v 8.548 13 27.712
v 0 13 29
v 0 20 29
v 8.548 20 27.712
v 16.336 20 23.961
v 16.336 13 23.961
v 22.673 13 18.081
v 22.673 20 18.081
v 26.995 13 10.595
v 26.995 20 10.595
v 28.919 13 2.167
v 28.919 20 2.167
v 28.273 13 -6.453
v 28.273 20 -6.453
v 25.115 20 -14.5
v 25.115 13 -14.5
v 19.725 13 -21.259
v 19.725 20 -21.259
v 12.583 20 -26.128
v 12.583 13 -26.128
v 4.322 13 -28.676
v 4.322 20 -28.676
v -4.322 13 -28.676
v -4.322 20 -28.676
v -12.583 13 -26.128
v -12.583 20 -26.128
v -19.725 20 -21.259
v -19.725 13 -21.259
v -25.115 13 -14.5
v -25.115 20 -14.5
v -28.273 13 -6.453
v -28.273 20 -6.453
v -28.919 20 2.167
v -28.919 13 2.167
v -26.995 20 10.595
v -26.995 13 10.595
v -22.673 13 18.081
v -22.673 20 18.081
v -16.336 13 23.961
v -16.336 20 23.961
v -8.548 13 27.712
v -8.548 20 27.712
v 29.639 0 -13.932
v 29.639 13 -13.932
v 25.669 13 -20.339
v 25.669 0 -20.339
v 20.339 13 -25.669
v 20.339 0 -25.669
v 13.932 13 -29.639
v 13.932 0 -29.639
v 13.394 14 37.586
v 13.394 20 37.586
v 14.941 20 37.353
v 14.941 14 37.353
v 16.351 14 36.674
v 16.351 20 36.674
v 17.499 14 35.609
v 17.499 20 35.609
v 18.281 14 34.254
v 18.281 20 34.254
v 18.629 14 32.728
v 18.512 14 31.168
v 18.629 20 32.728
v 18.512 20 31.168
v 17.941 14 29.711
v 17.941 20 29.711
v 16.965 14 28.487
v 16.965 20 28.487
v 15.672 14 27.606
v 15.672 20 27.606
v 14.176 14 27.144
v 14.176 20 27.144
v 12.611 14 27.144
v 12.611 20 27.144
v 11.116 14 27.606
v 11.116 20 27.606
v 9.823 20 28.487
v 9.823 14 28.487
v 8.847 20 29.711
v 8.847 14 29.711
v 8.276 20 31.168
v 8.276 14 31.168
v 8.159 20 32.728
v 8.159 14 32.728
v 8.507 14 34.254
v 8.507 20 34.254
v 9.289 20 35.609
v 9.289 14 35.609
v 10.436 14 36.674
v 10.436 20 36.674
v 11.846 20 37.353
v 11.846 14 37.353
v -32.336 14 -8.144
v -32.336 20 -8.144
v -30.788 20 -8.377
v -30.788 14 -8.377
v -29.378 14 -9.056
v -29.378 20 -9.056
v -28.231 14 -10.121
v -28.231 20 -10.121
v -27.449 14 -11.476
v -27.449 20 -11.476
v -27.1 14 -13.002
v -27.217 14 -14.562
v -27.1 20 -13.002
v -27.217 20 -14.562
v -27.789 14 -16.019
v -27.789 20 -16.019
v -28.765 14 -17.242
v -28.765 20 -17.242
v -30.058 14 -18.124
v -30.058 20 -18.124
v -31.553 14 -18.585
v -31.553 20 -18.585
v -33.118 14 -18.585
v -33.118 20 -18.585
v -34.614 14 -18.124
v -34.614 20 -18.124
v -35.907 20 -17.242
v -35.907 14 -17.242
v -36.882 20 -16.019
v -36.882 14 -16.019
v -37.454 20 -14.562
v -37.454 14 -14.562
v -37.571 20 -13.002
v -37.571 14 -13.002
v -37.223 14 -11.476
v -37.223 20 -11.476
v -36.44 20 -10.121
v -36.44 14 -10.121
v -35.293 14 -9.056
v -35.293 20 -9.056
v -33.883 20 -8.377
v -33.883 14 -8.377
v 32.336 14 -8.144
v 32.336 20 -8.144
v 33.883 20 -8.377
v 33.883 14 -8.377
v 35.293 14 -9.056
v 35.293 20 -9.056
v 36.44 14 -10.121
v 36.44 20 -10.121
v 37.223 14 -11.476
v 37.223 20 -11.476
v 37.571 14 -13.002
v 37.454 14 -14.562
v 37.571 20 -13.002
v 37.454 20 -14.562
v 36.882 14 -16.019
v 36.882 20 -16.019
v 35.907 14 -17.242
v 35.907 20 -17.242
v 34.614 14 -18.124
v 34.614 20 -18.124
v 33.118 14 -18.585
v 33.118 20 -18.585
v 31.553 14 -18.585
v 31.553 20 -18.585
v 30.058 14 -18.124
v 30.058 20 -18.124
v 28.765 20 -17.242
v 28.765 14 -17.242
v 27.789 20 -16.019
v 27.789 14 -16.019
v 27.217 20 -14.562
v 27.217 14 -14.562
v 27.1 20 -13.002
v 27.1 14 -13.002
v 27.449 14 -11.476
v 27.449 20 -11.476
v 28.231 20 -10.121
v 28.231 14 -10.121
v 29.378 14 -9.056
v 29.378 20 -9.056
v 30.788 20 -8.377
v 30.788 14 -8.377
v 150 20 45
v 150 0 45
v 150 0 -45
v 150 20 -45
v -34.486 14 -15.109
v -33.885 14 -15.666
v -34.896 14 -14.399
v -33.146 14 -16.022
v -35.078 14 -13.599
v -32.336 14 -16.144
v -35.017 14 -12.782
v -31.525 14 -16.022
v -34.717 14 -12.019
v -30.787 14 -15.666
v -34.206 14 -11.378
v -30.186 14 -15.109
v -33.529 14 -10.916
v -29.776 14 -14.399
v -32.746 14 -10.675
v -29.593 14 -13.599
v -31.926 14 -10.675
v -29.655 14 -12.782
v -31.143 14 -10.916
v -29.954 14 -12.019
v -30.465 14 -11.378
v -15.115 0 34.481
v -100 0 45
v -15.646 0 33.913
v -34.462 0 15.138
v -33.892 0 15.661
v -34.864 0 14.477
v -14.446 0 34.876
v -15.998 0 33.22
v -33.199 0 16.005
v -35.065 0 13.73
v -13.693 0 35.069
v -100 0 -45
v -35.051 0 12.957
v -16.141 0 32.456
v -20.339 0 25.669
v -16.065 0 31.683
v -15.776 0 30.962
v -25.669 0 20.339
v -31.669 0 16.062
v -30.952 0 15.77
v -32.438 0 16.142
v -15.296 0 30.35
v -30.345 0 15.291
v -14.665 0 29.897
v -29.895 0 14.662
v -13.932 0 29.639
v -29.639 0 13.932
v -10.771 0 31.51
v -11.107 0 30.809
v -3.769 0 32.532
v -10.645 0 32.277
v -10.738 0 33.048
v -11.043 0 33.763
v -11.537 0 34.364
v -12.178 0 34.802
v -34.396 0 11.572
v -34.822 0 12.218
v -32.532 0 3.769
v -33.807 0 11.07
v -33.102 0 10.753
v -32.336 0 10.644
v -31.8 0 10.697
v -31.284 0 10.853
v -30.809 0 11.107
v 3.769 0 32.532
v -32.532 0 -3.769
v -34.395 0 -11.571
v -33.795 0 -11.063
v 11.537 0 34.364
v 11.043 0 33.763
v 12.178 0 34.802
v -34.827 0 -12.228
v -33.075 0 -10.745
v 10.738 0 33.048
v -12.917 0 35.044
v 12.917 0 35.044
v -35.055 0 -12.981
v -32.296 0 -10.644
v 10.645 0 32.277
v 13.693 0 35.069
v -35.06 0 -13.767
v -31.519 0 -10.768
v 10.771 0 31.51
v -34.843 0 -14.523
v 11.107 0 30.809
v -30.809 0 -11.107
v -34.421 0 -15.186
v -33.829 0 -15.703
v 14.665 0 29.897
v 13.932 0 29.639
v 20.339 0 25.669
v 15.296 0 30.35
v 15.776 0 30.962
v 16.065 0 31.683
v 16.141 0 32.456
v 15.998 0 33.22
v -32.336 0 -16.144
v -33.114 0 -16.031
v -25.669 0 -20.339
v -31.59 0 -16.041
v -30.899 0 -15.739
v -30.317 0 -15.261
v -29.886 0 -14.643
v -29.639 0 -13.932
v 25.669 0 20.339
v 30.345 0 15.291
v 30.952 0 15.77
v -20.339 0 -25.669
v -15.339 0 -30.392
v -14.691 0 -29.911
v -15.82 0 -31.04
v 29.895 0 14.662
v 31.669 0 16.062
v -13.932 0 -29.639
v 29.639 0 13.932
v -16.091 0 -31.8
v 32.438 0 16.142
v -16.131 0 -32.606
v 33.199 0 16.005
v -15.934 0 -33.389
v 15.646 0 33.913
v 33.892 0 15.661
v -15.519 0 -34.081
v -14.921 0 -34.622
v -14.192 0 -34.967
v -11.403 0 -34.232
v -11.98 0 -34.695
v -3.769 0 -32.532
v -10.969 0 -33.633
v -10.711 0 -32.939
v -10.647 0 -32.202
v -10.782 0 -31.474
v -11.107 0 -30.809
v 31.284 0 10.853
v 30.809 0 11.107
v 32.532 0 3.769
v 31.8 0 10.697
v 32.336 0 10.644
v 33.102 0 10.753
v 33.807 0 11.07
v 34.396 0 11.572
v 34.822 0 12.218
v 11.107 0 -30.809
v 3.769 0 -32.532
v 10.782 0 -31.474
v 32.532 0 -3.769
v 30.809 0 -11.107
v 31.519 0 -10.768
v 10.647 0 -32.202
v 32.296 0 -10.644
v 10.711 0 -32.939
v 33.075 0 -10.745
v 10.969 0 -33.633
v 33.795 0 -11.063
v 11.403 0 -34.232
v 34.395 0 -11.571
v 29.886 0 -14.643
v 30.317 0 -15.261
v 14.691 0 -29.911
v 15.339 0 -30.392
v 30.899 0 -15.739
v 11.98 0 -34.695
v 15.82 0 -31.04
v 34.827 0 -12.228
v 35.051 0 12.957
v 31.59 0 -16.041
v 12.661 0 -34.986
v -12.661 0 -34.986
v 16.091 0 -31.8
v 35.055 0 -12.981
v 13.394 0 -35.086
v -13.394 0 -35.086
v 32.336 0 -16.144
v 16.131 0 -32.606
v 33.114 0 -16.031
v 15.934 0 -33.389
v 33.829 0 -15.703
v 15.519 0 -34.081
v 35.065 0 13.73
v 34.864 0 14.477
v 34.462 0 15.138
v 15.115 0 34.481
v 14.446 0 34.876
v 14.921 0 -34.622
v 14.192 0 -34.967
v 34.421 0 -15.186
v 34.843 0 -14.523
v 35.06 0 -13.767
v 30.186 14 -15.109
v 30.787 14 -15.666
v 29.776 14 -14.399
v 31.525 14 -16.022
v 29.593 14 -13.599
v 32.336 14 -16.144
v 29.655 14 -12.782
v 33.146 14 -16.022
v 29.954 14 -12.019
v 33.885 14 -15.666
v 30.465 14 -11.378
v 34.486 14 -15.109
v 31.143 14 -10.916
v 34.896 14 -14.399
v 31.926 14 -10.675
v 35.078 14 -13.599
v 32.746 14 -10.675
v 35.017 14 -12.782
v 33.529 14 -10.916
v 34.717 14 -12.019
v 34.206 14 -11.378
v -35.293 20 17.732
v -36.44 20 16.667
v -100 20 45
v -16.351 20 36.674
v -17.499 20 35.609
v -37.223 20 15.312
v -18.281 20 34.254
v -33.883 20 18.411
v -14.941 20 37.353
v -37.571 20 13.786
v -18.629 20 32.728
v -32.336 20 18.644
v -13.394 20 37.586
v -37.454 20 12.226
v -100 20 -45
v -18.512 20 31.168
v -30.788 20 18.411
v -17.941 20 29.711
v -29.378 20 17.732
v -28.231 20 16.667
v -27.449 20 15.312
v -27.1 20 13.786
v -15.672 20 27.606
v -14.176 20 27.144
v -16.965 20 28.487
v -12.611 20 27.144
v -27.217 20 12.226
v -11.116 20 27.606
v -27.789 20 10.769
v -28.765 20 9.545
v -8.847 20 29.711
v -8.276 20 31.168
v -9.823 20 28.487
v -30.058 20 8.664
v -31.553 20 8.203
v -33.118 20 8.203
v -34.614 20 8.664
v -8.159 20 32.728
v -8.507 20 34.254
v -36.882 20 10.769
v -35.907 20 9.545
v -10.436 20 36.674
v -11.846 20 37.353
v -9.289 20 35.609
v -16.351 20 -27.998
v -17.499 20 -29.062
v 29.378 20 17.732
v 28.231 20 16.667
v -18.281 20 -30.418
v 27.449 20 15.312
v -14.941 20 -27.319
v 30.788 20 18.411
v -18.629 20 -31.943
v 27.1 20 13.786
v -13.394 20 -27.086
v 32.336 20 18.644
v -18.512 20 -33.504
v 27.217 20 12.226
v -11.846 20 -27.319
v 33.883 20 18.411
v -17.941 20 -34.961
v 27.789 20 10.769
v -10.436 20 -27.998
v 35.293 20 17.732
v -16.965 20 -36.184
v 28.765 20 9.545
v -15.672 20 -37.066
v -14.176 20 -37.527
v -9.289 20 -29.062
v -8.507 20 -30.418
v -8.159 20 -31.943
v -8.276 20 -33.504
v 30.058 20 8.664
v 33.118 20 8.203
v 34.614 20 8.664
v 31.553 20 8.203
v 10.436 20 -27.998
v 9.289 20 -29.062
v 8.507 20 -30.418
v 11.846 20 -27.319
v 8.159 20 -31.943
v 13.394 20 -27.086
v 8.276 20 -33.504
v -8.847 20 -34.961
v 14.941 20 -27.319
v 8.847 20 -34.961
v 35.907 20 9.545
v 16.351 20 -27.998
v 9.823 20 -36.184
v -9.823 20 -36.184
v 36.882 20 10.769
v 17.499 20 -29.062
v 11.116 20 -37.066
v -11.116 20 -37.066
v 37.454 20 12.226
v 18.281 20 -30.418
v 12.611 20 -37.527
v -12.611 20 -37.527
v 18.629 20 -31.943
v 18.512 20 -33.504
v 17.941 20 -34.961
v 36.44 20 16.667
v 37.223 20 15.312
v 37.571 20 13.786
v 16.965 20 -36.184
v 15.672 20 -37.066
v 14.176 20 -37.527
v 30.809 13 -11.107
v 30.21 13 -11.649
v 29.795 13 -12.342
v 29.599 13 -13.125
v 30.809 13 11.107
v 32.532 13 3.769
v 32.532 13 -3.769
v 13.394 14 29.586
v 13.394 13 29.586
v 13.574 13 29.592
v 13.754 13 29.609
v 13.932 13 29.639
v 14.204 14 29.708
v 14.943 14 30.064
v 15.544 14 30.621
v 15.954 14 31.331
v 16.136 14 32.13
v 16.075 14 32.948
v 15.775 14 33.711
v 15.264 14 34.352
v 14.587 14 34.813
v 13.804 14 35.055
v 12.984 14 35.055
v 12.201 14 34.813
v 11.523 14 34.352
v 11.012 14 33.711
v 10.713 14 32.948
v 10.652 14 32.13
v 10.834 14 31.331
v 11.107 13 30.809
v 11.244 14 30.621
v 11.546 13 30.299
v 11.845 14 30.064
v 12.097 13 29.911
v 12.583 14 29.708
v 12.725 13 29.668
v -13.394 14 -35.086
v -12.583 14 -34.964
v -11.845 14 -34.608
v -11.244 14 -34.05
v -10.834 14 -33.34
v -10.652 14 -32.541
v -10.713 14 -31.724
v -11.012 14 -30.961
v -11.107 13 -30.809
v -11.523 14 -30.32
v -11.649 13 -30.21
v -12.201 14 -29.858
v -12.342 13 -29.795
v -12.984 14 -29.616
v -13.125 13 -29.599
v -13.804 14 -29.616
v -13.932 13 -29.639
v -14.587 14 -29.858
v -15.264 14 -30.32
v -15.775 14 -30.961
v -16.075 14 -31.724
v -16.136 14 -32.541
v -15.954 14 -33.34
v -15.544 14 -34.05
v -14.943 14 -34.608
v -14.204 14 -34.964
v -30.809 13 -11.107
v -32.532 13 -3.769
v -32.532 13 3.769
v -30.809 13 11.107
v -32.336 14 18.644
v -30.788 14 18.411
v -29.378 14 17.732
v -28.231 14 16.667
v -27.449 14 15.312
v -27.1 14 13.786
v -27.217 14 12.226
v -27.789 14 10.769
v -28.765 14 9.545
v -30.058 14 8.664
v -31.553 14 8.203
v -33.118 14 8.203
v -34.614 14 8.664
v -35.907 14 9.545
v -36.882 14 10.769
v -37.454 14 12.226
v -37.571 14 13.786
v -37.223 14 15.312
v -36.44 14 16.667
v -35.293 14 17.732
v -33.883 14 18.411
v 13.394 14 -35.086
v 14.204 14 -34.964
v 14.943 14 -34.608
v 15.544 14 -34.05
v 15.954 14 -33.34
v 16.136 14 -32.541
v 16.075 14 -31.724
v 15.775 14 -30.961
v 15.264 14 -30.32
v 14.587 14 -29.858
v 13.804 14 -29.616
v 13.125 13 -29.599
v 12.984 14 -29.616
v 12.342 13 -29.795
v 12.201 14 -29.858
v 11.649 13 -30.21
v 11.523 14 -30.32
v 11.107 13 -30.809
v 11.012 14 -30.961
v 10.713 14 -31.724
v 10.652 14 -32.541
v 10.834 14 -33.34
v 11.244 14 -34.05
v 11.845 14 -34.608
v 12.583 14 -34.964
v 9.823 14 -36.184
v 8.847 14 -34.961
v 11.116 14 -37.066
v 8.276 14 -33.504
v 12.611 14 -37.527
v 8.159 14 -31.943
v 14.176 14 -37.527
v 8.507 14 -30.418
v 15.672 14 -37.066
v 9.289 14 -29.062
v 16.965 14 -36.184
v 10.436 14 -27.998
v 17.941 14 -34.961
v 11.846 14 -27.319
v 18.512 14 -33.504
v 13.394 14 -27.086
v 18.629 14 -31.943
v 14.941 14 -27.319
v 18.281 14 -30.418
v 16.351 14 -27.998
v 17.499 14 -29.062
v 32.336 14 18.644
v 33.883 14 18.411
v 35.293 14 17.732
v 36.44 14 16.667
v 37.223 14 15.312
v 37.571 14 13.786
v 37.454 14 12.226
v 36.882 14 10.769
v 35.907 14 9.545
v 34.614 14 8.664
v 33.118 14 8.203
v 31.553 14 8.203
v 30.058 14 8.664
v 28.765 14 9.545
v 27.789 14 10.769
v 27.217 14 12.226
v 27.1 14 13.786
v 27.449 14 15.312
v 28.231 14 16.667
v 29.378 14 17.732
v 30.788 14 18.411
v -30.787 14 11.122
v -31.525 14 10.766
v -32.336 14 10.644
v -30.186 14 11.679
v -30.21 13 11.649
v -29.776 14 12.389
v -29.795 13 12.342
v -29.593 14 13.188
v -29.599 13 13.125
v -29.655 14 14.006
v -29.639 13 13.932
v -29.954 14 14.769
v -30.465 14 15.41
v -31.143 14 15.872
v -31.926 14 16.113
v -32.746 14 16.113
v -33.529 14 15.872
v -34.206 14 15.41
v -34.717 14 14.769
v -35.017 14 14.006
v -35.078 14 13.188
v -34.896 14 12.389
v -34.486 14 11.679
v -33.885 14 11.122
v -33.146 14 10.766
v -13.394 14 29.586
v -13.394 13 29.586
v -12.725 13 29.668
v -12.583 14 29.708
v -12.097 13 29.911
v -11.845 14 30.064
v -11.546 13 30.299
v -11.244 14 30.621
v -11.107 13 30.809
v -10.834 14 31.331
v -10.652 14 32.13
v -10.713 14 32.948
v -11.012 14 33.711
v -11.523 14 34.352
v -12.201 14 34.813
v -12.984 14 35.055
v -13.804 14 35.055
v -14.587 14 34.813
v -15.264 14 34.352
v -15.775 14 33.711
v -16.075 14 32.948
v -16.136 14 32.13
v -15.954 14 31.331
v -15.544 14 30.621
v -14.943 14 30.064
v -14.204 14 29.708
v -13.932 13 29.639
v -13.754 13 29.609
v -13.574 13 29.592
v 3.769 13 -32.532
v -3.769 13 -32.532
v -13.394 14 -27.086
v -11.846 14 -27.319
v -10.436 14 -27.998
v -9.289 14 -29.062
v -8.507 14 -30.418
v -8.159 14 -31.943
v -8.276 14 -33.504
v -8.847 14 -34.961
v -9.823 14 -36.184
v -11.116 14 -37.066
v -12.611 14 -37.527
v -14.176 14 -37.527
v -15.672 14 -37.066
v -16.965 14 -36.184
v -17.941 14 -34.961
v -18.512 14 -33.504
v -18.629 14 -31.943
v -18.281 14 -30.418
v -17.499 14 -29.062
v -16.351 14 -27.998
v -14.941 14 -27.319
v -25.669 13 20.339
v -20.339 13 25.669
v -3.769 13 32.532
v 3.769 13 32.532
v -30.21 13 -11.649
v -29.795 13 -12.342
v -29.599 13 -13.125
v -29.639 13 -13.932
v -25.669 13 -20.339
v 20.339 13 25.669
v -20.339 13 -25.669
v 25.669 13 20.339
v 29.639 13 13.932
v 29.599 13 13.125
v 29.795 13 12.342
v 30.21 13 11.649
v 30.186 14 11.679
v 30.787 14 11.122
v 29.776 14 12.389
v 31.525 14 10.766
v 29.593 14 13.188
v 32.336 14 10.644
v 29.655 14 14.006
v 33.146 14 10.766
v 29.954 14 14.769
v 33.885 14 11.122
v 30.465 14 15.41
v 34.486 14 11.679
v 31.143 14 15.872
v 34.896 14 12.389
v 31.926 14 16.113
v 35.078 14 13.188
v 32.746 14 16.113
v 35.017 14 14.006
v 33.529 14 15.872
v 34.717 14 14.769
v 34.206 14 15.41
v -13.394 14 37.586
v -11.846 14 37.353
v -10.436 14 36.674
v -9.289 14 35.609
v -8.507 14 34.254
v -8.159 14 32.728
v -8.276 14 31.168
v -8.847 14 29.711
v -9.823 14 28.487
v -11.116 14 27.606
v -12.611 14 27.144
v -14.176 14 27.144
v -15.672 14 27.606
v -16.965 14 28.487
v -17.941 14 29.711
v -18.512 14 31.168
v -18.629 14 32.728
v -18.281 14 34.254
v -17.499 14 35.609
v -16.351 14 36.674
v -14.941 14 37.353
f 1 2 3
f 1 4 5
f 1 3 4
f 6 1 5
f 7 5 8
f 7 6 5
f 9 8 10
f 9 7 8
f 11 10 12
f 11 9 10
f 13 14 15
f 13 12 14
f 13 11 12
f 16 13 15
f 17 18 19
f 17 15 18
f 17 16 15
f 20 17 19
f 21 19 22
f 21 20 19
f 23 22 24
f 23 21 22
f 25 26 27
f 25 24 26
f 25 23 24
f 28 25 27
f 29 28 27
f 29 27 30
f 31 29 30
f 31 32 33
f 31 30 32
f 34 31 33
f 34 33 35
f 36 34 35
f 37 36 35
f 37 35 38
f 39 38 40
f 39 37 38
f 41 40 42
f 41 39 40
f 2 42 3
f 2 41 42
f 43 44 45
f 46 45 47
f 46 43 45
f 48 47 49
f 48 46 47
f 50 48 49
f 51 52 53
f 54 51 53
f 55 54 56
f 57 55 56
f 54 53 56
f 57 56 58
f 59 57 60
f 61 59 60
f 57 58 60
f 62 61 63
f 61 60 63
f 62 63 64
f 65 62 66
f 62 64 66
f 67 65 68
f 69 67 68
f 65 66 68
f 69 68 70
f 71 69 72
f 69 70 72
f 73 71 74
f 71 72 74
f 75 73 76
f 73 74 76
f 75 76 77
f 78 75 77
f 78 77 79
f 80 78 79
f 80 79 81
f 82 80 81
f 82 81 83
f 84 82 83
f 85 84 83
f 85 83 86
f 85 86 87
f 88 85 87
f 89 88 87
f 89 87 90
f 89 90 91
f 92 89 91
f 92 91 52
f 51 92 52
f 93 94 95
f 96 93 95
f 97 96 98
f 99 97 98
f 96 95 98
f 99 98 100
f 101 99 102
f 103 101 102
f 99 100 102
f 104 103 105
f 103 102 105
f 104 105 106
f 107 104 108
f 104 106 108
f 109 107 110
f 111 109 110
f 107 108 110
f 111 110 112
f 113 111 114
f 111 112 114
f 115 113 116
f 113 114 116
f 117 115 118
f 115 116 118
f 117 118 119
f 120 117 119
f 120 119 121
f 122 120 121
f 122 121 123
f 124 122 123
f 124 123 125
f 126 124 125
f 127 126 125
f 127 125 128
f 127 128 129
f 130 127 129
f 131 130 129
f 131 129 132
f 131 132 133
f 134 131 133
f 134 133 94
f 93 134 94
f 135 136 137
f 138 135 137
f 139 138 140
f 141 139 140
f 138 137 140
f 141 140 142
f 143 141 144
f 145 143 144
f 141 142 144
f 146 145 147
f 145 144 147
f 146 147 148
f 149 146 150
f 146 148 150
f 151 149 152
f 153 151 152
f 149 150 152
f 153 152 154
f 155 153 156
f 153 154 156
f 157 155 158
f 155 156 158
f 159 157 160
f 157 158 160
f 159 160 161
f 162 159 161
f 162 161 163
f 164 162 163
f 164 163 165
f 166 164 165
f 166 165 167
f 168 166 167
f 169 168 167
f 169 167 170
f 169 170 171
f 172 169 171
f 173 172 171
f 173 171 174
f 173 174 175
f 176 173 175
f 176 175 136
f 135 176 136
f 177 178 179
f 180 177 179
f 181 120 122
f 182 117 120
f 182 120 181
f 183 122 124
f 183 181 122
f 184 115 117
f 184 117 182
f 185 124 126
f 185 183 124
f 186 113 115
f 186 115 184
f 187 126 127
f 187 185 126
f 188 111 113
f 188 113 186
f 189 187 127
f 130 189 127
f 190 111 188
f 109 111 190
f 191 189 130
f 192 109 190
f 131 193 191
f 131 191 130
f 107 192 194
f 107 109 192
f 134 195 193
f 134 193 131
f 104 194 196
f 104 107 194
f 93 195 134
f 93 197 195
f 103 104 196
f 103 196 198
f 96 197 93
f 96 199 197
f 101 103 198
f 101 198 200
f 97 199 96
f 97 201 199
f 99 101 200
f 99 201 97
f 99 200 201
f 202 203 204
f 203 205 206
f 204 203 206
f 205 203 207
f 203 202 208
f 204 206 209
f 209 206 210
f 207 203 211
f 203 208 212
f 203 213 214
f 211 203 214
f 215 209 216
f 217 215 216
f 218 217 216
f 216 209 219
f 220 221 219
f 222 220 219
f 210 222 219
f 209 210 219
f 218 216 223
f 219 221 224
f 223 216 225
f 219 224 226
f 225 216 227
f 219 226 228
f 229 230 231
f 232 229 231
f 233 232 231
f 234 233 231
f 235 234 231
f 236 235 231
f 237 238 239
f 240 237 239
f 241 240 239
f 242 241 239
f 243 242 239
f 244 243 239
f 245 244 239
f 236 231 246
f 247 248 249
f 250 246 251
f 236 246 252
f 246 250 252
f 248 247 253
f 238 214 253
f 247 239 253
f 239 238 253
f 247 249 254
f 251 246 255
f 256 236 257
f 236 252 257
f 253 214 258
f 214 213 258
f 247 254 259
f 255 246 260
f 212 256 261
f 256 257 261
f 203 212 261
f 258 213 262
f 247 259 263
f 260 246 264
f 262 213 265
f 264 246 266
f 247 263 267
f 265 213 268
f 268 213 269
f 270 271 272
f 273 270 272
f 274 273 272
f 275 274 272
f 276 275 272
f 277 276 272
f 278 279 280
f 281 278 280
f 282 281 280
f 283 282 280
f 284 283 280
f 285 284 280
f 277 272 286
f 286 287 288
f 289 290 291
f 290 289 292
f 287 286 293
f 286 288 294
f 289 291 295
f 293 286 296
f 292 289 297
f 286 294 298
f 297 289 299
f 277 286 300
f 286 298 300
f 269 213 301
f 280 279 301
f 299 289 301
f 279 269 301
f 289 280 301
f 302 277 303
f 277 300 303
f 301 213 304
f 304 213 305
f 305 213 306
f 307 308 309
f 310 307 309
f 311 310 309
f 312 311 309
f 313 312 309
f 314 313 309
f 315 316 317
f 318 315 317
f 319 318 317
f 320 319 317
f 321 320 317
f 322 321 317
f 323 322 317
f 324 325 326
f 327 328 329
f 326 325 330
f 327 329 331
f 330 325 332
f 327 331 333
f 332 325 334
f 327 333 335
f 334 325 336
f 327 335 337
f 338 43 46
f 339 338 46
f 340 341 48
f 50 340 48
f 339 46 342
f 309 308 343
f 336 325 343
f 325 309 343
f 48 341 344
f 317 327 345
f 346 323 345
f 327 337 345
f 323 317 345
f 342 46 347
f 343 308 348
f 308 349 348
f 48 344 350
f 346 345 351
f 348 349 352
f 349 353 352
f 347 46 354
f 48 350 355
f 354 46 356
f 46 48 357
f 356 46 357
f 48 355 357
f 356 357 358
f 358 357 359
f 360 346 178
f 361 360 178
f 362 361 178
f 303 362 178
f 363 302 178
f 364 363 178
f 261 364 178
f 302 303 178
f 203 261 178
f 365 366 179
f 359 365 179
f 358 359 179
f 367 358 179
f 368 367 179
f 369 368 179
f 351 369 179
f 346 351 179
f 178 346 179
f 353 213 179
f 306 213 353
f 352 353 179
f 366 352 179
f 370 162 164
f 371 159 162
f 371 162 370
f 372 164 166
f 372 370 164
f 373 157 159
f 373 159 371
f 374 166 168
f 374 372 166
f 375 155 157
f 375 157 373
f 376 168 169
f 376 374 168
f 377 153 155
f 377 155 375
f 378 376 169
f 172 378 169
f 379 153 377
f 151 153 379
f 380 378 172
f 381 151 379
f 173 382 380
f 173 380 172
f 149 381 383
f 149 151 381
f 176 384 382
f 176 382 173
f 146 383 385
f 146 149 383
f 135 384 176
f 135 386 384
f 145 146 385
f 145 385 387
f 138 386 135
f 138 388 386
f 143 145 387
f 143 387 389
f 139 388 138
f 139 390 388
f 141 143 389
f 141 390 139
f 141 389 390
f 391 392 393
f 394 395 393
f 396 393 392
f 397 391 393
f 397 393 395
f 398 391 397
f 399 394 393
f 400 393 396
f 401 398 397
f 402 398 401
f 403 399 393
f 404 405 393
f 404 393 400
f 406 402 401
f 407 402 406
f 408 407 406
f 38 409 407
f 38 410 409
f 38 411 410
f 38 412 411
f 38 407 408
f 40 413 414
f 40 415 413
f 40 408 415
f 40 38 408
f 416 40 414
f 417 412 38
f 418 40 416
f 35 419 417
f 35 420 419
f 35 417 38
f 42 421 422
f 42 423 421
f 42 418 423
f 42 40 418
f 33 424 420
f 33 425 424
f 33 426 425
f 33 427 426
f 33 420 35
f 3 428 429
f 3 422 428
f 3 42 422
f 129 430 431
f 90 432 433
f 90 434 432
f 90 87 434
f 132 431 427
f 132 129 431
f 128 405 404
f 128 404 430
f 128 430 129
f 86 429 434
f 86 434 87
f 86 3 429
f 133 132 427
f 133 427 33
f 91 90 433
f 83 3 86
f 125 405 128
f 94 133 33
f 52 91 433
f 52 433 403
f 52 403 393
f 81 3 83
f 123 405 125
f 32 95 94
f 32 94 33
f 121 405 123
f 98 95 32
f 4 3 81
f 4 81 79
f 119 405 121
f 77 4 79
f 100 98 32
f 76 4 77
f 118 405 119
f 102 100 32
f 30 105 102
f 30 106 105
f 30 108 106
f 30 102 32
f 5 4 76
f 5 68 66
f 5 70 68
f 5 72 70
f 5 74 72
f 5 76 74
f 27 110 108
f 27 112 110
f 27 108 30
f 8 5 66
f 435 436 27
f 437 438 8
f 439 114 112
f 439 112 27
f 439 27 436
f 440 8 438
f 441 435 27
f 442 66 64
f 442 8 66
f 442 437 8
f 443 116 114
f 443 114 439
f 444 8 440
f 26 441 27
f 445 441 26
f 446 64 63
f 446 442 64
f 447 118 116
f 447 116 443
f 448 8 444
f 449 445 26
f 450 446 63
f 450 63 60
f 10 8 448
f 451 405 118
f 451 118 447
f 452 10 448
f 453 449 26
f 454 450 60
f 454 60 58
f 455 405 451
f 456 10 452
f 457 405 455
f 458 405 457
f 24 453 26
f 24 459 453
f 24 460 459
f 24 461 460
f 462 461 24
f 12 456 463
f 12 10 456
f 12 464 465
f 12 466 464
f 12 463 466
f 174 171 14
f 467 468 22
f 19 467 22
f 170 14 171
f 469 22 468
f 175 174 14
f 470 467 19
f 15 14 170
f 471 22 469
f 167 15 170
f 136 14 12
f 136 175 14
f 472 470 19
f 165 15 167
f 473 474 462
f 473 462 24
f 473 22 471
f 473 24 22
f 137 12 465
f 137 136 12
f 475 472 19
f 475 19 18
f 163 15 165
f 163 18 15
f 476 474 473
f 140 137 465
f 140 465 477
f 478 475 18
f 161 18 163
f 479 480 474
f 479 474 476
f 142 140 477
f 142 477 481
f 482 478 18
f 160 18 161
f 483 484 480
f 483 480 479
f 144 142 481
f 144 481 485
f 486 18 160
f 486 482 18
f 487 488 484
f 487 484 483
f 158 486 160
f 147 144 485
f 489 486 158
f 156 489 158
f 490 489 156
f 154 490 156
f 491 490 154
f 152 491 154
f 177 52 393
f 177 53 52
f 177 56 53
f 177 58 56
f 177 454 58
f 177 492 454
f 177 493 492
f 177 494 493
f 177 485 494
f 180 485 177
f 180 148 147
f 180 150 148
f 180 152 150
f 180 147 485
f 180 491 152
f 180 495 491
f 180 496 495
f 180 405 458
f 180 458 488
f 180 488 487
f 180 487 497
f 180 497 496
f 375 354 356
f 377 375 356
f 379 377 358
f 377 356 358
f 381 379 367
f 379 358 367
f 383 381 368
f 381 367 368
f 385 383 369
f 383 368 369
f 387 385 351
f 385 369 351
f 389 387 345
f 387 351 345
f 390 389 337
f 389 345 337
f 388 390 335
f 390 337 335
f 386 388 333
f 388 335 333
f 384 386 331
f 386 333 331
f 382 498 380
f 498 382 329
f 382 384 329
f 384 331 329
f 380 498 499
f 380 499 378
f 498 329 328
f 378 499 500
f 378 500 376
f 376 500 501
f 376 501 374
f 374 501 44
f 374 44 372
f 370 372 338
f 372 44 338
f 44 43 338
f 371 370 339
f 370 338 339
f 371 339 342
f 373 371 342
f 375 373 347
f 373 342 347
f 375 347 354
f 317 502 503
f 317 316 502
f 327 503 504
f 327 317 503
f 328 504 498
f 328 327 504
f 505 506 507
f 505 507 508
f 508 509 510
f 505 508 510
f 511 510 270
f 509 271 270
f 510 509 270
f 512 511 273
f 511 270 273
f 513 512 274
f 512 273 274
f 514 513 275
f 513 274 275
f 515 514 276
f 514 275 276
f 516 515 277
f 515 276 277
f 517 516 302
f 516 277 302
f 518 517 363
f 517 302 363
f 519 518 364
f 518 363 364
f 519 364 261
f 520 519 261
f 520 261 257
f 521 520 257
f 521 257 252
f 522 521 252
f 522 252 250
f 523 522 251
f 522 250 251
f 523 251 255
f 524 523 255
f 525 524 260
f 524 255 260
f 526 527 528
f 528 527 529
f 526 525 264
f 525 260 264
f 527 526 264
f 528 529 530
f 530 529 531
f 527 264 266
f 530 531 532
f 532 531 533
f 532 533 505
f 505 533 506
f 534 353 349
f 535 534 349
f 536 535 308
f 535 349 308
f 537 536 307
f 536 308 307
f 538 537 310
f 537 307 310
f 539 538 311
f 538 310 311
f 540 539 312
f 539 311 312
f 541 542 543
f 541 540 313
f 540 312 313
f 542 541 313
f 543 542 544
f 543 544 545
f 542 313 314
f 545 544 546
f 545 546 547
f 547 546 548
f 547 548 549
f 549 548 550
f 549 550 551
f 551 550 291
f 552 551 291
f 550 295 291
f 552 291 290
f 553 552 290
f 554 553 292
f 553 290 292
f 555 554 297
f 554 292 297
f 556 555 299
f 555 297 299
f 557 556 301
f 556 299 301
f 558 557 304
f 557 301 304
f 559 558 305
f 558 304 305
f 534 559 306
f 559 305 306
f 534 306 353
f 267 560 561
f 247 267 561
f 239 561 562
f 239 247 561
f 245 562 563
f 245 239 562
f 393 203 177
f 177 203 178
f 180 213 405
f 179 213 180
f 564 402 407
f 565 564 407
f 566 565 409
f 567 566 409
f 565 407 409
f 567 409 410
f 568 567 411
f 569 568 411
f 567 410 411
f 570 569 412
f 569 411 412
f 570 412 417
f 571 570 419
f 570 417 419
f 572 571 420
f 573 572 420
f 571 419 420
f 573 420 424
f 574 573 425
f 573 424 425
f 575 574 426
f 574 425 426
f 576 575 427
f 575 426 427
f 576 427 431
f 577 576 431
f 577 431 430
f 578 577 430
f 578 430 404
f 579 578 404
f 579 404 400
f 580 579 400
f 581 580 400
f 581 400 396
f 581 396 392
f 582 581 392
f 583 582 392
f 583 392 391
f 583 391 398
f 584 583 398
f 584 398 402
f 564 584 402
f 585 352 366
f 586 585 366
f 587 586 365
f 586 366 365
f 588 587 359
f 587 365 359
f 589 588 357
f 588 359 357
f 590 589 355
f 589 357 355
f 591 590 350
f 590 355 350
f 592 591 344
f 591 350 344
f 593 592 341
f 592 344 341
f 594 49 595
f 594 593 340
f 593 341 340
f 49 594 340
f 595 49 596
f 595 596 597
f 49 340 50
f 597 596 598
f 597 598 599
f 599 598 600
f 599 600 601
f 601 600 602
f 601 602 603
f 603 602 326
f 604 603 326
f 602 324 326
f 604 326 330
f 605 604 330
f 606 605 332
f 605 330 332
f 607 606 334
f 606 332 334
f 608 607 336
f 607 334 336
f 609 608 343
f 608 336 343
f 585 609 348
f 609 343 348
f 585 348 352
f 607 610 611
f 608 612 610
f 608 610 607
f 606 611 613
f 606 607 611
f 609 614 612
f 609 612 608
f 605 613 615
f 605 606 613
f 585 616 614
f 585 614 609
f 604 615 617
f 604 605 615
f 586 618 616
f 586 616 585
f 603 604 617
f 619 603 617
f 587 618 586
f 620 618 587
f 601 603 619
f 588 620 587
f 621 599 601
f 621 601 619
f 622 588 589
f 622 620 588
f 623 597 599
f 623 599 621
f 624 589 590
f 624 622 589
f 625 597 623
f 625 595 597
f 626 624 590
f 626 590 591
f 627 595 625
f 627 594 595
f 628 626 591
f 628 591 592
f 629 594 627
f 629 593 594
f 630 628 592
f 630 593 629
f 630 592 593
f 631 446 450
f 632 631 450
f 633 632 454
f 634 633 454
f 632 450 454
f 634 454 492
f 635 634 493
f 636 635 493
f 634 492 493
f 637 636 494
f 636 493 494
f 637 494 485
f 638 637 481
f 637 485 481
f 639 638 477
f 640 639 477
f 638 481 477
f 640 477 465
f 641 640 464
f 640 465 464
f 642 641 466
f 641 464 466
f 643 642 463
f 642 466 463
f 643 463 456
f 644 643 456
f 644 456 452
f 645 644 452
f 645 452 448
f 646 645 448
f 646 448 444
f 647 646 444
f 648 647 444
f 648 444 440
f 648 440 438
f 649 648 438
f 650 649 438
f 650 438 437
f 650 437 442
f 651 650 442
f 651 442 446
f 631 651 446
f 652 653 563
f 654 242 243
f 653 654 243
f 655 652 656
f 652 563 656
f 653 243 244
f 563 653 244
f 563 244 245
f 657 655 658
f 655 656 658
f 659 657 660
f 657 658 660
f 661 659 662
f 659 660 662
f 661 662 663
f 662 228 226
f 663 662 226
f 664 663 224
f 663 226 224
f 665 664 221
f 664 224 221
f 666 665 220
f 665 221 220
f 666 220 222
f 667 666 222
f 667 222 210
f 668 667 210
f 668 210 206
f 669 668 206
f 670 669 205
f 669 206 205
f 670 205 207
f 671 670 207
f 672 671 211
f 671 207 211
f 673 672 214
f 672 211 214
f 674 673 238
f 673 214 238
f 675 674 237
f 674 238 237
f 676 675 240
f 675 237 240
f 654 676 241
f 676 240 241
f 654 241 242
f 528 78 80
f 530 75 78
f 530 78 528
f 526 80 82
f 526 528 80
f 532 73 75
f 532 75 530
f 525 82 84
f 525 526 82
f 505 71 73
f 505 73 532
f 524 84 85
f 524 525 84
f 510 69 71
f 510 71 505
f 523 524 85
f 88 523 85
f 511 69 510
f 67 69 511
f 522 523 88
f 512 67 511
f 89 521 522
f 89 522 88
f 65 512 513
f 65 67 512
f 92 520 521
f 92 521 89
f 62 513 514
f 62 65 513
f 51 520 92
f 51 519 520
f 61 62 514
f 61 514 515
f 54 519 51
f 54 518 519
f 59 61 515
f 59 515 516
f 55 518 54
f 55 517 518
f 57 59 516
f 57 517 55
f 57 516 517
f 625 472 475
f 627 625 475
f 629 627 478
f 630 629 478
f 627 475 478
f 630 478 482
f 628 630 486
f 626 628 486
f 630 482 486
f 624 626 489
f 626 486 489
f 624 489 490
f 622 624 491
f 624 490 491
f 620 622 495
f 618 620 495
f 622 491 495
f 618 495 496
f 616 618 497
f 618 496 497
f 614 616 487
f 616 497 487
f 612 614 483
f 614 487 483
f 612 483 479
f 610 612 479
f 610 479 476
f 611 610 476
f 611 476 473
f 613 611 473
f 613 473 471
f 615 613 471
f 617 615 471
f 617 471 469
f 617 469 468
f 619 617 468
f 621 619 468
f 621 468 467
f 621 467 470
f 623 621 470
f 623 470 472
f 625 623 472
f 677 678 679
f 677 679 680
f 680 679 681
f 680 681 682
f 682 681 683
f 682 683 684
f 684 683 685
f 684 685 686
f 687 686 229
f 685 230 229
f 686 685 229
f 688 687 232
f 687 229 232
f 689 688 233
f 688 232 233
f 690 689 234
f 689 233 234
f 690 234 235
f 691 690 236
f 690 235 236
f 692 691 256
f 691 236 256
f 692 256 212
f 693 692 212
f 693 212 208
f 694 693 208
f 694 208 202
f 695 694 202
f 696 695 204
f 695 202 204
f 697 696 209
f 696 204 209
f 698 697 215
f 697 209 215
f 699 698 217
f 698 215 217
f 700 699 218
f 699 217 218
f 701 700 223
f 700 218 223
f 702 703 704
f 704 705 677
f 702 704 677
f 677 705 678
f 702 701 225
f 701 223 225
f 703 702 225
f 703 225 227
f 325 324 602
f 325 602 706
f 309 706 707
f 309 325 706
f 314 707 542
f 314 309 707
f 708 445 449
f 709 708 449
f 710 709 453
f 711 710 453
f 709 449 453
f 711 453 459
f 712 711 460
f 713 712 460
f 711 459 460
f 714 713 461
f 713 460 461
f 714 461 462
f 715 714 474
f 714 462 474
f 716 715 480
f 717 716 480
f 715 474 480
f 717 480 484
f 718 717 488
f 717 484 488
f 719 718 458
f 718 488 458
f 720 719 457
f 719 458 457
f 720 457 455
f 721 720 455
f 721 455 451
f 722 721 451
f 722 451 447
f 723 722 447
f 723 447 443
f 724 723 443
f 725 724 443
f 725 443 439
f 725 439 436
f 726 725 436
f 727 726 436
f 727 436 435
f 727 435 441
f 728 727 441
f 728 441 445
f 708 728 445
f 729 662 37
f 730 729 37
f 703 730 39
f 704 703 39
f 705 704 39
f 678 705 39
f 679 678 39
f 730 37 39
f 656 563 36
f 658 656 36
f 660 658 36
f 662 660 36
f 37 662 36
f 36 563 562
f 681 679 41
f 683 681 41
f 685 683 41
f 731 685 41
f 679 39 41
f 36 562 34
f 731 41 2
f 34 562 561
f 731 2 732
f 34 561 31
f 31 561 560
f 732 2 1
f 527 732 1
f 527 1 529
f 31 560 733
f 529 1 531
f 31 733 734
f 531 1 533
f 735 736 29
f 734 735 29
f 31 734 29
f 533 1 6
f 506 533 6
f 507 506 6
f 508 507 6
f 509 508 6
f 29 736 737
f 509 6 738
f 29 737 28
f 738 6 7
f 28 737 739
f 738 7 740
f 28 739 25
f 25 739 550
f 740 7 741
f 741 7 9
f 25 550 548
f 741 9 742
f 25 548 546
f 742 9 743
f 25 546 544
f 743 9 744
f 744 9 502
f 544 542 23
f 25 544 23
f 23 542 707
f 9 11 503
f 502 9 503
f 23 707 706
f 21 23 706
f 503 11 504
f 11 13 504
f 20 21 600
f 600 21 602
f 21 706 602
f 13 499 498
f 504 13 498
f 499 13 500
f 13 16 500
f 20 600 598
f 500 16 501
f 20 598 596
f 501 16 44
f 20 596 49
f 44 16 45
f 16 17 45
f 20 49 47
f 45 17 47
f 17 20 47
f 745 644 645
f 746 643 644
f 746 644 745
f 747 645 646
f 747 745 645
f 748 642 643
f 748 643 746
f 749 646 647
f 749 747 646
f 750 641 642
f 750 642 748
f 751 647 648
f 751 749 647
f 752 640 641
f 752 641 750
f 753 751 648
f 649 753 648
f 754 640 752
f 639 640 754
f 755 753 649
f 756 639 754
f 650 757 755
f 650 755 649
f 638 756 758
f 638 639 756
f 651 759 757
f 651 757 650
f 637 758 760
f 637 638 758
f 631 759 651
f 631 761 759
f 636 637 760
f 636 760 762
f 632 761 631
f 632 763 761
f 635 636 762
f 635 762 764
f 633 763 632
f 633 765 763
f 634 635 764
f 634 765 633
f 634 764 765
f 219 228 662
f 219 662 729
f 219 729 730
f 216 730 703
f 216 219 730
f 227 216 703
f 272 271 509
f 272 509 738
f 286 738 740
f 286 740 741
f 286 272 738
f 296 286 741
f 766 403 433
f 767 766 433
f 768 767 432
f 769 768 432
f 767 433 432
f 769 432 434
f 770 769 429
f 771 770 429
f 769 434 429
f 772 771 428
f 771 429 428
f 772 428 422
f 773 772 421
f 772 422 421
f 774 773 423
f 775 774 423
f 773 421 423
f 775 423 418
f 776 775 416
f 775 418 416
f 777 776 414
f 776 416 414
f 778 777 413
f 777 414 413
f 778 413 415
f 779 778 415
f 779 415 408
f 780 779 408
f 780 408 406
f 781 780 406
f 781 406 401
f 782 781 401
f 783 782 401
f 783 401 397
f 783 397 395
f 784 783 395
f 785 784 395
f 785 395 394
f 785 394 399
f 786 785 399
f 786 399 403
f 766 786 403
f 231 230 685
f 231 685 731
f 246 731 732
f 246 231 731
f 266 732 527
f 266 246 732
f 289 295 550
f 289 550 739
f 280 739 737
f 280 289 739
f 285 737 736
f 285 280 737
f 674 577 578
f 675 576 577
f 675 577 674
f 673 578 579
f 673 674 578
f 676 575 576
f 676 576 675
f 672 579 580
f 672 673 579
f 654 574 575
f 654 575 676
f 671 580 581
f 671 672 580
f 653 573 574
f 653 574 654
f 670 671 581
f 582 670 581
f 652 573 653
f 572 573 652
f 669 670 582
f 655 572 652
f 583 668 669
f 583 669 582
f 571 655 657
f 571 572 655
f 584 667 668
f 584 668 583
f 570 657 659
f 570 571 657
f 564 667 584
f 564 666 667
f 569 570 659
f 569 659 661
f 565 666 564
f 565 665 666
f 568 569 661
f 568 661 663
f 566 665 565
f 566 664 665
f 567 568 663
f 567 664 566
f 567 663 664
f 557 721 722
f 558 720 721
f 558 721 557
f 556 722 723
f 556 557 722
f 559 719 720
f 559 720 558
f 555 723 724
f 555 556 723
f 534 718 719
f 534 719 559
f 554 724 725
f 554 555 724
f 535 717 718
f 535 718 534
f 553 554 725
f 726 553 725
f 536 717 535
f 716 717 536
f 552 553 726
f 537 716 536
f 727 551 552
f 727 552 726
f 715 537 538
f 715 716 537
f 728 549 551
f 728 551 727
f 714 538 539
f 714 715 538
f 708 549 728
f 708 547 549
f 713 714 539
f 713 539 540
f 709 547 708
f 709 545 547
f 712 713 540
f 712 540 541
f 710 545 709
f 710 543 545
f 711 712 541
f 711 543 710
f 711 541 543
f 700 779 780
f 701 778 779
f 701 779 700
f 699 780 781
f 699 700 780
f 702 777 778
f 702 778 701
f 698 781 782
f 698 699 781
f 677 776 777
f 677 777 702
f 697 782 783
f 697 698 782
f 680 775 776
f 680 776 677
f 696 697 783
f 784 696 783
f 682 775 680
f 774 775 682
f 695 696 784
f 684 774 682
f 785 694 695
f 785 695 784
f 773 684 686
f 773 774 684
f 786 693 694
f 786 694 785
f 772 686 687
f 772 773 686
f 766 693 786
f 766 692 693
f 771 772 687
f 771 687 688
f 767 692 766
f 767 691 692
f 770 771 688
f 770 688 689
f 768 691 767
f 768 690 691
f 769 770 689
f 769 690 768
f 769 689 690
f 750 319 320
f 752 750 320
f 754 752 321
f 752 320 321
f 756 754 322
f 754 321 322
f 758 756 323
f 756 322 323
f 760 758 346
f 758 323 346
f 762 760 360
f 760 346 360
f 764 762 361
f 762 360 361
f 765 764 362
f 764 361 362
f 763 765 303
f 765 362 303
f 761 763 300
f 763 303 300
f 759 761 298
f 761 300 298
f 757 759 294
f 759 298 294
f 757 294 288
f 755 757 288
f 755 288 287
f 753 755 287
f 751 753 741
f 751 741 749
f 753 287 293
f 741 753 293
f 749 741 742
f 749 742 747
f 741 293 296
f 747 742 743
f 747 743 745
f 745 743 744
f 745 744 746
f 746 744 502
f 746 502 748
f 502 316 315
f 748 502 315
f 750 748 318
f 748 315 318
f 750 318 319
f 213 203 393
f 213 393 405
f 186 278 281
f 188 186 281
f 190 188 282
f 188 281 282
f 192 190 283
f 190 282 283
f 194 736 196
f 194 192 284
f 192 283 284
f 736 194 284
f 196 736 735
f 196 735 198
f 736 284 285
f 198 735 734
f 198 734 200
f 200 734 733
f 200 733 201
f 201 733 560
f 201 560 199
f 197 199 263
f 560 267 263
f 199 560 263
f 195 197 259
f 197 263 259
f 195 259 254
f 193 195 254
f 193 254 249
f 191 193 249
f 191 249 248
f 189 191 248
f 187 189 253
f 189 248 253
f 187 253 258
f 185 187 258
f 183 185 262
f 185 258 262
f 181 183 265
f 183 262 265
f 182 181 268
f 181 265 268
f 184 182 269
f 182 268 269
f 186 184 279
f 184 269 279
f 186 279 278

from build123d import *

# Parameters (mm, degrees)
SKETCH1_W                               = 250
SKETCH1_H                               = 90
BOSS_EXTRUDE1_DEPTH                     = 20
CUT_EXTRUDE1_DEPTH                      = 158.876534038
CUT_EXTRUDE1_DEPTH_BACK                 = 158.876534038
SKETCH11_R                              = 29
CBORE_FOR_M5_HEX_HEAD_BOLT2_D           = 5.5
CBORE_FOR_M5_HEX_HEAD_BOLT2_CBORE_D     = 10.5
CBORE_FOR_M5_HEX_HEAD_BOLT2_CBORE_DEPTH = 6
SKETCH15_R                              = 32.75
CUT_EXTRUDE2_DEPTH                      = 13


with BuildPart() as part:
    # Sketch1 → Boss-Extrude1 (new body)
    with BuildSketch(Plane(origin=(0, 0, 0), x_dir=(1, 0, 0), z_dir=(0, 1, 0))):
        with Locations((25, 0)):
            Rectangle(SKETCH1_W, SKETCH1_H)
    extrude(amount=BOSS_EXTRUDE1_DEPTH)

    # Sketch11 → Cut-Extrude1 (cut, two sides: drawn at the far end of the back side and taken through both)
    with BuildSketch(Plane(origin=(0, 20, 0), x_dir=(1, 0, 0), z_dir=(0, 1, 0)).offset(-CUT_EXTRUDE1_DEPTH_BACK)):
        with Locations(Location((0, 0, 0), (0, 0, 270))):
            Circle(SKETCH11_R)
    extrude(amount=CUT_EXTRUDE1_DEPTH + CUT_EXTRUDE1_DEPTH_BACK, mode=Mode.SUBTRACT)

    # CBORE for M5 Hex Head Bolt2 (through all)
    with Locations(Plane(origin=(-32.335783638, 20, -13.393920133), x_dir=(0, 0, 1), z_dir=(0, 1, 0))):
        with Locations((0, 0), (-18.941863505, 18.941863505), (-18.941863505, 45.729703771), (0, 64.671567276), (26.787840266, 64.671567276), (45.729703771, 45.729703771), (45.729703771, 18.941863505), (26.787840266, 0)):
            CounterBoreHole(CBORE_FOR_M5_HEX_HEAD_BOLT2_D / 2, CBORE_FOR_M5_HEX_HEAD_BOLT2_CBORE_D / 2, CBORE_FOR_M5_HEX_HEAD_BOLT2_CBORE_DEPTH)

    # Sketch15 → Cut-Extrude2 (cut)
    with BuildSketch(Plane(origin=(0, 0, 0), x_dir=(1, 0, 0), z_dir=(0, 1, 0))):
        Circle(SKETCH15_R)
    extrude(amount=CUT_EXTRUDE2_DEPTH, mode=Mode.SUBTRACT)


solid = part.part
